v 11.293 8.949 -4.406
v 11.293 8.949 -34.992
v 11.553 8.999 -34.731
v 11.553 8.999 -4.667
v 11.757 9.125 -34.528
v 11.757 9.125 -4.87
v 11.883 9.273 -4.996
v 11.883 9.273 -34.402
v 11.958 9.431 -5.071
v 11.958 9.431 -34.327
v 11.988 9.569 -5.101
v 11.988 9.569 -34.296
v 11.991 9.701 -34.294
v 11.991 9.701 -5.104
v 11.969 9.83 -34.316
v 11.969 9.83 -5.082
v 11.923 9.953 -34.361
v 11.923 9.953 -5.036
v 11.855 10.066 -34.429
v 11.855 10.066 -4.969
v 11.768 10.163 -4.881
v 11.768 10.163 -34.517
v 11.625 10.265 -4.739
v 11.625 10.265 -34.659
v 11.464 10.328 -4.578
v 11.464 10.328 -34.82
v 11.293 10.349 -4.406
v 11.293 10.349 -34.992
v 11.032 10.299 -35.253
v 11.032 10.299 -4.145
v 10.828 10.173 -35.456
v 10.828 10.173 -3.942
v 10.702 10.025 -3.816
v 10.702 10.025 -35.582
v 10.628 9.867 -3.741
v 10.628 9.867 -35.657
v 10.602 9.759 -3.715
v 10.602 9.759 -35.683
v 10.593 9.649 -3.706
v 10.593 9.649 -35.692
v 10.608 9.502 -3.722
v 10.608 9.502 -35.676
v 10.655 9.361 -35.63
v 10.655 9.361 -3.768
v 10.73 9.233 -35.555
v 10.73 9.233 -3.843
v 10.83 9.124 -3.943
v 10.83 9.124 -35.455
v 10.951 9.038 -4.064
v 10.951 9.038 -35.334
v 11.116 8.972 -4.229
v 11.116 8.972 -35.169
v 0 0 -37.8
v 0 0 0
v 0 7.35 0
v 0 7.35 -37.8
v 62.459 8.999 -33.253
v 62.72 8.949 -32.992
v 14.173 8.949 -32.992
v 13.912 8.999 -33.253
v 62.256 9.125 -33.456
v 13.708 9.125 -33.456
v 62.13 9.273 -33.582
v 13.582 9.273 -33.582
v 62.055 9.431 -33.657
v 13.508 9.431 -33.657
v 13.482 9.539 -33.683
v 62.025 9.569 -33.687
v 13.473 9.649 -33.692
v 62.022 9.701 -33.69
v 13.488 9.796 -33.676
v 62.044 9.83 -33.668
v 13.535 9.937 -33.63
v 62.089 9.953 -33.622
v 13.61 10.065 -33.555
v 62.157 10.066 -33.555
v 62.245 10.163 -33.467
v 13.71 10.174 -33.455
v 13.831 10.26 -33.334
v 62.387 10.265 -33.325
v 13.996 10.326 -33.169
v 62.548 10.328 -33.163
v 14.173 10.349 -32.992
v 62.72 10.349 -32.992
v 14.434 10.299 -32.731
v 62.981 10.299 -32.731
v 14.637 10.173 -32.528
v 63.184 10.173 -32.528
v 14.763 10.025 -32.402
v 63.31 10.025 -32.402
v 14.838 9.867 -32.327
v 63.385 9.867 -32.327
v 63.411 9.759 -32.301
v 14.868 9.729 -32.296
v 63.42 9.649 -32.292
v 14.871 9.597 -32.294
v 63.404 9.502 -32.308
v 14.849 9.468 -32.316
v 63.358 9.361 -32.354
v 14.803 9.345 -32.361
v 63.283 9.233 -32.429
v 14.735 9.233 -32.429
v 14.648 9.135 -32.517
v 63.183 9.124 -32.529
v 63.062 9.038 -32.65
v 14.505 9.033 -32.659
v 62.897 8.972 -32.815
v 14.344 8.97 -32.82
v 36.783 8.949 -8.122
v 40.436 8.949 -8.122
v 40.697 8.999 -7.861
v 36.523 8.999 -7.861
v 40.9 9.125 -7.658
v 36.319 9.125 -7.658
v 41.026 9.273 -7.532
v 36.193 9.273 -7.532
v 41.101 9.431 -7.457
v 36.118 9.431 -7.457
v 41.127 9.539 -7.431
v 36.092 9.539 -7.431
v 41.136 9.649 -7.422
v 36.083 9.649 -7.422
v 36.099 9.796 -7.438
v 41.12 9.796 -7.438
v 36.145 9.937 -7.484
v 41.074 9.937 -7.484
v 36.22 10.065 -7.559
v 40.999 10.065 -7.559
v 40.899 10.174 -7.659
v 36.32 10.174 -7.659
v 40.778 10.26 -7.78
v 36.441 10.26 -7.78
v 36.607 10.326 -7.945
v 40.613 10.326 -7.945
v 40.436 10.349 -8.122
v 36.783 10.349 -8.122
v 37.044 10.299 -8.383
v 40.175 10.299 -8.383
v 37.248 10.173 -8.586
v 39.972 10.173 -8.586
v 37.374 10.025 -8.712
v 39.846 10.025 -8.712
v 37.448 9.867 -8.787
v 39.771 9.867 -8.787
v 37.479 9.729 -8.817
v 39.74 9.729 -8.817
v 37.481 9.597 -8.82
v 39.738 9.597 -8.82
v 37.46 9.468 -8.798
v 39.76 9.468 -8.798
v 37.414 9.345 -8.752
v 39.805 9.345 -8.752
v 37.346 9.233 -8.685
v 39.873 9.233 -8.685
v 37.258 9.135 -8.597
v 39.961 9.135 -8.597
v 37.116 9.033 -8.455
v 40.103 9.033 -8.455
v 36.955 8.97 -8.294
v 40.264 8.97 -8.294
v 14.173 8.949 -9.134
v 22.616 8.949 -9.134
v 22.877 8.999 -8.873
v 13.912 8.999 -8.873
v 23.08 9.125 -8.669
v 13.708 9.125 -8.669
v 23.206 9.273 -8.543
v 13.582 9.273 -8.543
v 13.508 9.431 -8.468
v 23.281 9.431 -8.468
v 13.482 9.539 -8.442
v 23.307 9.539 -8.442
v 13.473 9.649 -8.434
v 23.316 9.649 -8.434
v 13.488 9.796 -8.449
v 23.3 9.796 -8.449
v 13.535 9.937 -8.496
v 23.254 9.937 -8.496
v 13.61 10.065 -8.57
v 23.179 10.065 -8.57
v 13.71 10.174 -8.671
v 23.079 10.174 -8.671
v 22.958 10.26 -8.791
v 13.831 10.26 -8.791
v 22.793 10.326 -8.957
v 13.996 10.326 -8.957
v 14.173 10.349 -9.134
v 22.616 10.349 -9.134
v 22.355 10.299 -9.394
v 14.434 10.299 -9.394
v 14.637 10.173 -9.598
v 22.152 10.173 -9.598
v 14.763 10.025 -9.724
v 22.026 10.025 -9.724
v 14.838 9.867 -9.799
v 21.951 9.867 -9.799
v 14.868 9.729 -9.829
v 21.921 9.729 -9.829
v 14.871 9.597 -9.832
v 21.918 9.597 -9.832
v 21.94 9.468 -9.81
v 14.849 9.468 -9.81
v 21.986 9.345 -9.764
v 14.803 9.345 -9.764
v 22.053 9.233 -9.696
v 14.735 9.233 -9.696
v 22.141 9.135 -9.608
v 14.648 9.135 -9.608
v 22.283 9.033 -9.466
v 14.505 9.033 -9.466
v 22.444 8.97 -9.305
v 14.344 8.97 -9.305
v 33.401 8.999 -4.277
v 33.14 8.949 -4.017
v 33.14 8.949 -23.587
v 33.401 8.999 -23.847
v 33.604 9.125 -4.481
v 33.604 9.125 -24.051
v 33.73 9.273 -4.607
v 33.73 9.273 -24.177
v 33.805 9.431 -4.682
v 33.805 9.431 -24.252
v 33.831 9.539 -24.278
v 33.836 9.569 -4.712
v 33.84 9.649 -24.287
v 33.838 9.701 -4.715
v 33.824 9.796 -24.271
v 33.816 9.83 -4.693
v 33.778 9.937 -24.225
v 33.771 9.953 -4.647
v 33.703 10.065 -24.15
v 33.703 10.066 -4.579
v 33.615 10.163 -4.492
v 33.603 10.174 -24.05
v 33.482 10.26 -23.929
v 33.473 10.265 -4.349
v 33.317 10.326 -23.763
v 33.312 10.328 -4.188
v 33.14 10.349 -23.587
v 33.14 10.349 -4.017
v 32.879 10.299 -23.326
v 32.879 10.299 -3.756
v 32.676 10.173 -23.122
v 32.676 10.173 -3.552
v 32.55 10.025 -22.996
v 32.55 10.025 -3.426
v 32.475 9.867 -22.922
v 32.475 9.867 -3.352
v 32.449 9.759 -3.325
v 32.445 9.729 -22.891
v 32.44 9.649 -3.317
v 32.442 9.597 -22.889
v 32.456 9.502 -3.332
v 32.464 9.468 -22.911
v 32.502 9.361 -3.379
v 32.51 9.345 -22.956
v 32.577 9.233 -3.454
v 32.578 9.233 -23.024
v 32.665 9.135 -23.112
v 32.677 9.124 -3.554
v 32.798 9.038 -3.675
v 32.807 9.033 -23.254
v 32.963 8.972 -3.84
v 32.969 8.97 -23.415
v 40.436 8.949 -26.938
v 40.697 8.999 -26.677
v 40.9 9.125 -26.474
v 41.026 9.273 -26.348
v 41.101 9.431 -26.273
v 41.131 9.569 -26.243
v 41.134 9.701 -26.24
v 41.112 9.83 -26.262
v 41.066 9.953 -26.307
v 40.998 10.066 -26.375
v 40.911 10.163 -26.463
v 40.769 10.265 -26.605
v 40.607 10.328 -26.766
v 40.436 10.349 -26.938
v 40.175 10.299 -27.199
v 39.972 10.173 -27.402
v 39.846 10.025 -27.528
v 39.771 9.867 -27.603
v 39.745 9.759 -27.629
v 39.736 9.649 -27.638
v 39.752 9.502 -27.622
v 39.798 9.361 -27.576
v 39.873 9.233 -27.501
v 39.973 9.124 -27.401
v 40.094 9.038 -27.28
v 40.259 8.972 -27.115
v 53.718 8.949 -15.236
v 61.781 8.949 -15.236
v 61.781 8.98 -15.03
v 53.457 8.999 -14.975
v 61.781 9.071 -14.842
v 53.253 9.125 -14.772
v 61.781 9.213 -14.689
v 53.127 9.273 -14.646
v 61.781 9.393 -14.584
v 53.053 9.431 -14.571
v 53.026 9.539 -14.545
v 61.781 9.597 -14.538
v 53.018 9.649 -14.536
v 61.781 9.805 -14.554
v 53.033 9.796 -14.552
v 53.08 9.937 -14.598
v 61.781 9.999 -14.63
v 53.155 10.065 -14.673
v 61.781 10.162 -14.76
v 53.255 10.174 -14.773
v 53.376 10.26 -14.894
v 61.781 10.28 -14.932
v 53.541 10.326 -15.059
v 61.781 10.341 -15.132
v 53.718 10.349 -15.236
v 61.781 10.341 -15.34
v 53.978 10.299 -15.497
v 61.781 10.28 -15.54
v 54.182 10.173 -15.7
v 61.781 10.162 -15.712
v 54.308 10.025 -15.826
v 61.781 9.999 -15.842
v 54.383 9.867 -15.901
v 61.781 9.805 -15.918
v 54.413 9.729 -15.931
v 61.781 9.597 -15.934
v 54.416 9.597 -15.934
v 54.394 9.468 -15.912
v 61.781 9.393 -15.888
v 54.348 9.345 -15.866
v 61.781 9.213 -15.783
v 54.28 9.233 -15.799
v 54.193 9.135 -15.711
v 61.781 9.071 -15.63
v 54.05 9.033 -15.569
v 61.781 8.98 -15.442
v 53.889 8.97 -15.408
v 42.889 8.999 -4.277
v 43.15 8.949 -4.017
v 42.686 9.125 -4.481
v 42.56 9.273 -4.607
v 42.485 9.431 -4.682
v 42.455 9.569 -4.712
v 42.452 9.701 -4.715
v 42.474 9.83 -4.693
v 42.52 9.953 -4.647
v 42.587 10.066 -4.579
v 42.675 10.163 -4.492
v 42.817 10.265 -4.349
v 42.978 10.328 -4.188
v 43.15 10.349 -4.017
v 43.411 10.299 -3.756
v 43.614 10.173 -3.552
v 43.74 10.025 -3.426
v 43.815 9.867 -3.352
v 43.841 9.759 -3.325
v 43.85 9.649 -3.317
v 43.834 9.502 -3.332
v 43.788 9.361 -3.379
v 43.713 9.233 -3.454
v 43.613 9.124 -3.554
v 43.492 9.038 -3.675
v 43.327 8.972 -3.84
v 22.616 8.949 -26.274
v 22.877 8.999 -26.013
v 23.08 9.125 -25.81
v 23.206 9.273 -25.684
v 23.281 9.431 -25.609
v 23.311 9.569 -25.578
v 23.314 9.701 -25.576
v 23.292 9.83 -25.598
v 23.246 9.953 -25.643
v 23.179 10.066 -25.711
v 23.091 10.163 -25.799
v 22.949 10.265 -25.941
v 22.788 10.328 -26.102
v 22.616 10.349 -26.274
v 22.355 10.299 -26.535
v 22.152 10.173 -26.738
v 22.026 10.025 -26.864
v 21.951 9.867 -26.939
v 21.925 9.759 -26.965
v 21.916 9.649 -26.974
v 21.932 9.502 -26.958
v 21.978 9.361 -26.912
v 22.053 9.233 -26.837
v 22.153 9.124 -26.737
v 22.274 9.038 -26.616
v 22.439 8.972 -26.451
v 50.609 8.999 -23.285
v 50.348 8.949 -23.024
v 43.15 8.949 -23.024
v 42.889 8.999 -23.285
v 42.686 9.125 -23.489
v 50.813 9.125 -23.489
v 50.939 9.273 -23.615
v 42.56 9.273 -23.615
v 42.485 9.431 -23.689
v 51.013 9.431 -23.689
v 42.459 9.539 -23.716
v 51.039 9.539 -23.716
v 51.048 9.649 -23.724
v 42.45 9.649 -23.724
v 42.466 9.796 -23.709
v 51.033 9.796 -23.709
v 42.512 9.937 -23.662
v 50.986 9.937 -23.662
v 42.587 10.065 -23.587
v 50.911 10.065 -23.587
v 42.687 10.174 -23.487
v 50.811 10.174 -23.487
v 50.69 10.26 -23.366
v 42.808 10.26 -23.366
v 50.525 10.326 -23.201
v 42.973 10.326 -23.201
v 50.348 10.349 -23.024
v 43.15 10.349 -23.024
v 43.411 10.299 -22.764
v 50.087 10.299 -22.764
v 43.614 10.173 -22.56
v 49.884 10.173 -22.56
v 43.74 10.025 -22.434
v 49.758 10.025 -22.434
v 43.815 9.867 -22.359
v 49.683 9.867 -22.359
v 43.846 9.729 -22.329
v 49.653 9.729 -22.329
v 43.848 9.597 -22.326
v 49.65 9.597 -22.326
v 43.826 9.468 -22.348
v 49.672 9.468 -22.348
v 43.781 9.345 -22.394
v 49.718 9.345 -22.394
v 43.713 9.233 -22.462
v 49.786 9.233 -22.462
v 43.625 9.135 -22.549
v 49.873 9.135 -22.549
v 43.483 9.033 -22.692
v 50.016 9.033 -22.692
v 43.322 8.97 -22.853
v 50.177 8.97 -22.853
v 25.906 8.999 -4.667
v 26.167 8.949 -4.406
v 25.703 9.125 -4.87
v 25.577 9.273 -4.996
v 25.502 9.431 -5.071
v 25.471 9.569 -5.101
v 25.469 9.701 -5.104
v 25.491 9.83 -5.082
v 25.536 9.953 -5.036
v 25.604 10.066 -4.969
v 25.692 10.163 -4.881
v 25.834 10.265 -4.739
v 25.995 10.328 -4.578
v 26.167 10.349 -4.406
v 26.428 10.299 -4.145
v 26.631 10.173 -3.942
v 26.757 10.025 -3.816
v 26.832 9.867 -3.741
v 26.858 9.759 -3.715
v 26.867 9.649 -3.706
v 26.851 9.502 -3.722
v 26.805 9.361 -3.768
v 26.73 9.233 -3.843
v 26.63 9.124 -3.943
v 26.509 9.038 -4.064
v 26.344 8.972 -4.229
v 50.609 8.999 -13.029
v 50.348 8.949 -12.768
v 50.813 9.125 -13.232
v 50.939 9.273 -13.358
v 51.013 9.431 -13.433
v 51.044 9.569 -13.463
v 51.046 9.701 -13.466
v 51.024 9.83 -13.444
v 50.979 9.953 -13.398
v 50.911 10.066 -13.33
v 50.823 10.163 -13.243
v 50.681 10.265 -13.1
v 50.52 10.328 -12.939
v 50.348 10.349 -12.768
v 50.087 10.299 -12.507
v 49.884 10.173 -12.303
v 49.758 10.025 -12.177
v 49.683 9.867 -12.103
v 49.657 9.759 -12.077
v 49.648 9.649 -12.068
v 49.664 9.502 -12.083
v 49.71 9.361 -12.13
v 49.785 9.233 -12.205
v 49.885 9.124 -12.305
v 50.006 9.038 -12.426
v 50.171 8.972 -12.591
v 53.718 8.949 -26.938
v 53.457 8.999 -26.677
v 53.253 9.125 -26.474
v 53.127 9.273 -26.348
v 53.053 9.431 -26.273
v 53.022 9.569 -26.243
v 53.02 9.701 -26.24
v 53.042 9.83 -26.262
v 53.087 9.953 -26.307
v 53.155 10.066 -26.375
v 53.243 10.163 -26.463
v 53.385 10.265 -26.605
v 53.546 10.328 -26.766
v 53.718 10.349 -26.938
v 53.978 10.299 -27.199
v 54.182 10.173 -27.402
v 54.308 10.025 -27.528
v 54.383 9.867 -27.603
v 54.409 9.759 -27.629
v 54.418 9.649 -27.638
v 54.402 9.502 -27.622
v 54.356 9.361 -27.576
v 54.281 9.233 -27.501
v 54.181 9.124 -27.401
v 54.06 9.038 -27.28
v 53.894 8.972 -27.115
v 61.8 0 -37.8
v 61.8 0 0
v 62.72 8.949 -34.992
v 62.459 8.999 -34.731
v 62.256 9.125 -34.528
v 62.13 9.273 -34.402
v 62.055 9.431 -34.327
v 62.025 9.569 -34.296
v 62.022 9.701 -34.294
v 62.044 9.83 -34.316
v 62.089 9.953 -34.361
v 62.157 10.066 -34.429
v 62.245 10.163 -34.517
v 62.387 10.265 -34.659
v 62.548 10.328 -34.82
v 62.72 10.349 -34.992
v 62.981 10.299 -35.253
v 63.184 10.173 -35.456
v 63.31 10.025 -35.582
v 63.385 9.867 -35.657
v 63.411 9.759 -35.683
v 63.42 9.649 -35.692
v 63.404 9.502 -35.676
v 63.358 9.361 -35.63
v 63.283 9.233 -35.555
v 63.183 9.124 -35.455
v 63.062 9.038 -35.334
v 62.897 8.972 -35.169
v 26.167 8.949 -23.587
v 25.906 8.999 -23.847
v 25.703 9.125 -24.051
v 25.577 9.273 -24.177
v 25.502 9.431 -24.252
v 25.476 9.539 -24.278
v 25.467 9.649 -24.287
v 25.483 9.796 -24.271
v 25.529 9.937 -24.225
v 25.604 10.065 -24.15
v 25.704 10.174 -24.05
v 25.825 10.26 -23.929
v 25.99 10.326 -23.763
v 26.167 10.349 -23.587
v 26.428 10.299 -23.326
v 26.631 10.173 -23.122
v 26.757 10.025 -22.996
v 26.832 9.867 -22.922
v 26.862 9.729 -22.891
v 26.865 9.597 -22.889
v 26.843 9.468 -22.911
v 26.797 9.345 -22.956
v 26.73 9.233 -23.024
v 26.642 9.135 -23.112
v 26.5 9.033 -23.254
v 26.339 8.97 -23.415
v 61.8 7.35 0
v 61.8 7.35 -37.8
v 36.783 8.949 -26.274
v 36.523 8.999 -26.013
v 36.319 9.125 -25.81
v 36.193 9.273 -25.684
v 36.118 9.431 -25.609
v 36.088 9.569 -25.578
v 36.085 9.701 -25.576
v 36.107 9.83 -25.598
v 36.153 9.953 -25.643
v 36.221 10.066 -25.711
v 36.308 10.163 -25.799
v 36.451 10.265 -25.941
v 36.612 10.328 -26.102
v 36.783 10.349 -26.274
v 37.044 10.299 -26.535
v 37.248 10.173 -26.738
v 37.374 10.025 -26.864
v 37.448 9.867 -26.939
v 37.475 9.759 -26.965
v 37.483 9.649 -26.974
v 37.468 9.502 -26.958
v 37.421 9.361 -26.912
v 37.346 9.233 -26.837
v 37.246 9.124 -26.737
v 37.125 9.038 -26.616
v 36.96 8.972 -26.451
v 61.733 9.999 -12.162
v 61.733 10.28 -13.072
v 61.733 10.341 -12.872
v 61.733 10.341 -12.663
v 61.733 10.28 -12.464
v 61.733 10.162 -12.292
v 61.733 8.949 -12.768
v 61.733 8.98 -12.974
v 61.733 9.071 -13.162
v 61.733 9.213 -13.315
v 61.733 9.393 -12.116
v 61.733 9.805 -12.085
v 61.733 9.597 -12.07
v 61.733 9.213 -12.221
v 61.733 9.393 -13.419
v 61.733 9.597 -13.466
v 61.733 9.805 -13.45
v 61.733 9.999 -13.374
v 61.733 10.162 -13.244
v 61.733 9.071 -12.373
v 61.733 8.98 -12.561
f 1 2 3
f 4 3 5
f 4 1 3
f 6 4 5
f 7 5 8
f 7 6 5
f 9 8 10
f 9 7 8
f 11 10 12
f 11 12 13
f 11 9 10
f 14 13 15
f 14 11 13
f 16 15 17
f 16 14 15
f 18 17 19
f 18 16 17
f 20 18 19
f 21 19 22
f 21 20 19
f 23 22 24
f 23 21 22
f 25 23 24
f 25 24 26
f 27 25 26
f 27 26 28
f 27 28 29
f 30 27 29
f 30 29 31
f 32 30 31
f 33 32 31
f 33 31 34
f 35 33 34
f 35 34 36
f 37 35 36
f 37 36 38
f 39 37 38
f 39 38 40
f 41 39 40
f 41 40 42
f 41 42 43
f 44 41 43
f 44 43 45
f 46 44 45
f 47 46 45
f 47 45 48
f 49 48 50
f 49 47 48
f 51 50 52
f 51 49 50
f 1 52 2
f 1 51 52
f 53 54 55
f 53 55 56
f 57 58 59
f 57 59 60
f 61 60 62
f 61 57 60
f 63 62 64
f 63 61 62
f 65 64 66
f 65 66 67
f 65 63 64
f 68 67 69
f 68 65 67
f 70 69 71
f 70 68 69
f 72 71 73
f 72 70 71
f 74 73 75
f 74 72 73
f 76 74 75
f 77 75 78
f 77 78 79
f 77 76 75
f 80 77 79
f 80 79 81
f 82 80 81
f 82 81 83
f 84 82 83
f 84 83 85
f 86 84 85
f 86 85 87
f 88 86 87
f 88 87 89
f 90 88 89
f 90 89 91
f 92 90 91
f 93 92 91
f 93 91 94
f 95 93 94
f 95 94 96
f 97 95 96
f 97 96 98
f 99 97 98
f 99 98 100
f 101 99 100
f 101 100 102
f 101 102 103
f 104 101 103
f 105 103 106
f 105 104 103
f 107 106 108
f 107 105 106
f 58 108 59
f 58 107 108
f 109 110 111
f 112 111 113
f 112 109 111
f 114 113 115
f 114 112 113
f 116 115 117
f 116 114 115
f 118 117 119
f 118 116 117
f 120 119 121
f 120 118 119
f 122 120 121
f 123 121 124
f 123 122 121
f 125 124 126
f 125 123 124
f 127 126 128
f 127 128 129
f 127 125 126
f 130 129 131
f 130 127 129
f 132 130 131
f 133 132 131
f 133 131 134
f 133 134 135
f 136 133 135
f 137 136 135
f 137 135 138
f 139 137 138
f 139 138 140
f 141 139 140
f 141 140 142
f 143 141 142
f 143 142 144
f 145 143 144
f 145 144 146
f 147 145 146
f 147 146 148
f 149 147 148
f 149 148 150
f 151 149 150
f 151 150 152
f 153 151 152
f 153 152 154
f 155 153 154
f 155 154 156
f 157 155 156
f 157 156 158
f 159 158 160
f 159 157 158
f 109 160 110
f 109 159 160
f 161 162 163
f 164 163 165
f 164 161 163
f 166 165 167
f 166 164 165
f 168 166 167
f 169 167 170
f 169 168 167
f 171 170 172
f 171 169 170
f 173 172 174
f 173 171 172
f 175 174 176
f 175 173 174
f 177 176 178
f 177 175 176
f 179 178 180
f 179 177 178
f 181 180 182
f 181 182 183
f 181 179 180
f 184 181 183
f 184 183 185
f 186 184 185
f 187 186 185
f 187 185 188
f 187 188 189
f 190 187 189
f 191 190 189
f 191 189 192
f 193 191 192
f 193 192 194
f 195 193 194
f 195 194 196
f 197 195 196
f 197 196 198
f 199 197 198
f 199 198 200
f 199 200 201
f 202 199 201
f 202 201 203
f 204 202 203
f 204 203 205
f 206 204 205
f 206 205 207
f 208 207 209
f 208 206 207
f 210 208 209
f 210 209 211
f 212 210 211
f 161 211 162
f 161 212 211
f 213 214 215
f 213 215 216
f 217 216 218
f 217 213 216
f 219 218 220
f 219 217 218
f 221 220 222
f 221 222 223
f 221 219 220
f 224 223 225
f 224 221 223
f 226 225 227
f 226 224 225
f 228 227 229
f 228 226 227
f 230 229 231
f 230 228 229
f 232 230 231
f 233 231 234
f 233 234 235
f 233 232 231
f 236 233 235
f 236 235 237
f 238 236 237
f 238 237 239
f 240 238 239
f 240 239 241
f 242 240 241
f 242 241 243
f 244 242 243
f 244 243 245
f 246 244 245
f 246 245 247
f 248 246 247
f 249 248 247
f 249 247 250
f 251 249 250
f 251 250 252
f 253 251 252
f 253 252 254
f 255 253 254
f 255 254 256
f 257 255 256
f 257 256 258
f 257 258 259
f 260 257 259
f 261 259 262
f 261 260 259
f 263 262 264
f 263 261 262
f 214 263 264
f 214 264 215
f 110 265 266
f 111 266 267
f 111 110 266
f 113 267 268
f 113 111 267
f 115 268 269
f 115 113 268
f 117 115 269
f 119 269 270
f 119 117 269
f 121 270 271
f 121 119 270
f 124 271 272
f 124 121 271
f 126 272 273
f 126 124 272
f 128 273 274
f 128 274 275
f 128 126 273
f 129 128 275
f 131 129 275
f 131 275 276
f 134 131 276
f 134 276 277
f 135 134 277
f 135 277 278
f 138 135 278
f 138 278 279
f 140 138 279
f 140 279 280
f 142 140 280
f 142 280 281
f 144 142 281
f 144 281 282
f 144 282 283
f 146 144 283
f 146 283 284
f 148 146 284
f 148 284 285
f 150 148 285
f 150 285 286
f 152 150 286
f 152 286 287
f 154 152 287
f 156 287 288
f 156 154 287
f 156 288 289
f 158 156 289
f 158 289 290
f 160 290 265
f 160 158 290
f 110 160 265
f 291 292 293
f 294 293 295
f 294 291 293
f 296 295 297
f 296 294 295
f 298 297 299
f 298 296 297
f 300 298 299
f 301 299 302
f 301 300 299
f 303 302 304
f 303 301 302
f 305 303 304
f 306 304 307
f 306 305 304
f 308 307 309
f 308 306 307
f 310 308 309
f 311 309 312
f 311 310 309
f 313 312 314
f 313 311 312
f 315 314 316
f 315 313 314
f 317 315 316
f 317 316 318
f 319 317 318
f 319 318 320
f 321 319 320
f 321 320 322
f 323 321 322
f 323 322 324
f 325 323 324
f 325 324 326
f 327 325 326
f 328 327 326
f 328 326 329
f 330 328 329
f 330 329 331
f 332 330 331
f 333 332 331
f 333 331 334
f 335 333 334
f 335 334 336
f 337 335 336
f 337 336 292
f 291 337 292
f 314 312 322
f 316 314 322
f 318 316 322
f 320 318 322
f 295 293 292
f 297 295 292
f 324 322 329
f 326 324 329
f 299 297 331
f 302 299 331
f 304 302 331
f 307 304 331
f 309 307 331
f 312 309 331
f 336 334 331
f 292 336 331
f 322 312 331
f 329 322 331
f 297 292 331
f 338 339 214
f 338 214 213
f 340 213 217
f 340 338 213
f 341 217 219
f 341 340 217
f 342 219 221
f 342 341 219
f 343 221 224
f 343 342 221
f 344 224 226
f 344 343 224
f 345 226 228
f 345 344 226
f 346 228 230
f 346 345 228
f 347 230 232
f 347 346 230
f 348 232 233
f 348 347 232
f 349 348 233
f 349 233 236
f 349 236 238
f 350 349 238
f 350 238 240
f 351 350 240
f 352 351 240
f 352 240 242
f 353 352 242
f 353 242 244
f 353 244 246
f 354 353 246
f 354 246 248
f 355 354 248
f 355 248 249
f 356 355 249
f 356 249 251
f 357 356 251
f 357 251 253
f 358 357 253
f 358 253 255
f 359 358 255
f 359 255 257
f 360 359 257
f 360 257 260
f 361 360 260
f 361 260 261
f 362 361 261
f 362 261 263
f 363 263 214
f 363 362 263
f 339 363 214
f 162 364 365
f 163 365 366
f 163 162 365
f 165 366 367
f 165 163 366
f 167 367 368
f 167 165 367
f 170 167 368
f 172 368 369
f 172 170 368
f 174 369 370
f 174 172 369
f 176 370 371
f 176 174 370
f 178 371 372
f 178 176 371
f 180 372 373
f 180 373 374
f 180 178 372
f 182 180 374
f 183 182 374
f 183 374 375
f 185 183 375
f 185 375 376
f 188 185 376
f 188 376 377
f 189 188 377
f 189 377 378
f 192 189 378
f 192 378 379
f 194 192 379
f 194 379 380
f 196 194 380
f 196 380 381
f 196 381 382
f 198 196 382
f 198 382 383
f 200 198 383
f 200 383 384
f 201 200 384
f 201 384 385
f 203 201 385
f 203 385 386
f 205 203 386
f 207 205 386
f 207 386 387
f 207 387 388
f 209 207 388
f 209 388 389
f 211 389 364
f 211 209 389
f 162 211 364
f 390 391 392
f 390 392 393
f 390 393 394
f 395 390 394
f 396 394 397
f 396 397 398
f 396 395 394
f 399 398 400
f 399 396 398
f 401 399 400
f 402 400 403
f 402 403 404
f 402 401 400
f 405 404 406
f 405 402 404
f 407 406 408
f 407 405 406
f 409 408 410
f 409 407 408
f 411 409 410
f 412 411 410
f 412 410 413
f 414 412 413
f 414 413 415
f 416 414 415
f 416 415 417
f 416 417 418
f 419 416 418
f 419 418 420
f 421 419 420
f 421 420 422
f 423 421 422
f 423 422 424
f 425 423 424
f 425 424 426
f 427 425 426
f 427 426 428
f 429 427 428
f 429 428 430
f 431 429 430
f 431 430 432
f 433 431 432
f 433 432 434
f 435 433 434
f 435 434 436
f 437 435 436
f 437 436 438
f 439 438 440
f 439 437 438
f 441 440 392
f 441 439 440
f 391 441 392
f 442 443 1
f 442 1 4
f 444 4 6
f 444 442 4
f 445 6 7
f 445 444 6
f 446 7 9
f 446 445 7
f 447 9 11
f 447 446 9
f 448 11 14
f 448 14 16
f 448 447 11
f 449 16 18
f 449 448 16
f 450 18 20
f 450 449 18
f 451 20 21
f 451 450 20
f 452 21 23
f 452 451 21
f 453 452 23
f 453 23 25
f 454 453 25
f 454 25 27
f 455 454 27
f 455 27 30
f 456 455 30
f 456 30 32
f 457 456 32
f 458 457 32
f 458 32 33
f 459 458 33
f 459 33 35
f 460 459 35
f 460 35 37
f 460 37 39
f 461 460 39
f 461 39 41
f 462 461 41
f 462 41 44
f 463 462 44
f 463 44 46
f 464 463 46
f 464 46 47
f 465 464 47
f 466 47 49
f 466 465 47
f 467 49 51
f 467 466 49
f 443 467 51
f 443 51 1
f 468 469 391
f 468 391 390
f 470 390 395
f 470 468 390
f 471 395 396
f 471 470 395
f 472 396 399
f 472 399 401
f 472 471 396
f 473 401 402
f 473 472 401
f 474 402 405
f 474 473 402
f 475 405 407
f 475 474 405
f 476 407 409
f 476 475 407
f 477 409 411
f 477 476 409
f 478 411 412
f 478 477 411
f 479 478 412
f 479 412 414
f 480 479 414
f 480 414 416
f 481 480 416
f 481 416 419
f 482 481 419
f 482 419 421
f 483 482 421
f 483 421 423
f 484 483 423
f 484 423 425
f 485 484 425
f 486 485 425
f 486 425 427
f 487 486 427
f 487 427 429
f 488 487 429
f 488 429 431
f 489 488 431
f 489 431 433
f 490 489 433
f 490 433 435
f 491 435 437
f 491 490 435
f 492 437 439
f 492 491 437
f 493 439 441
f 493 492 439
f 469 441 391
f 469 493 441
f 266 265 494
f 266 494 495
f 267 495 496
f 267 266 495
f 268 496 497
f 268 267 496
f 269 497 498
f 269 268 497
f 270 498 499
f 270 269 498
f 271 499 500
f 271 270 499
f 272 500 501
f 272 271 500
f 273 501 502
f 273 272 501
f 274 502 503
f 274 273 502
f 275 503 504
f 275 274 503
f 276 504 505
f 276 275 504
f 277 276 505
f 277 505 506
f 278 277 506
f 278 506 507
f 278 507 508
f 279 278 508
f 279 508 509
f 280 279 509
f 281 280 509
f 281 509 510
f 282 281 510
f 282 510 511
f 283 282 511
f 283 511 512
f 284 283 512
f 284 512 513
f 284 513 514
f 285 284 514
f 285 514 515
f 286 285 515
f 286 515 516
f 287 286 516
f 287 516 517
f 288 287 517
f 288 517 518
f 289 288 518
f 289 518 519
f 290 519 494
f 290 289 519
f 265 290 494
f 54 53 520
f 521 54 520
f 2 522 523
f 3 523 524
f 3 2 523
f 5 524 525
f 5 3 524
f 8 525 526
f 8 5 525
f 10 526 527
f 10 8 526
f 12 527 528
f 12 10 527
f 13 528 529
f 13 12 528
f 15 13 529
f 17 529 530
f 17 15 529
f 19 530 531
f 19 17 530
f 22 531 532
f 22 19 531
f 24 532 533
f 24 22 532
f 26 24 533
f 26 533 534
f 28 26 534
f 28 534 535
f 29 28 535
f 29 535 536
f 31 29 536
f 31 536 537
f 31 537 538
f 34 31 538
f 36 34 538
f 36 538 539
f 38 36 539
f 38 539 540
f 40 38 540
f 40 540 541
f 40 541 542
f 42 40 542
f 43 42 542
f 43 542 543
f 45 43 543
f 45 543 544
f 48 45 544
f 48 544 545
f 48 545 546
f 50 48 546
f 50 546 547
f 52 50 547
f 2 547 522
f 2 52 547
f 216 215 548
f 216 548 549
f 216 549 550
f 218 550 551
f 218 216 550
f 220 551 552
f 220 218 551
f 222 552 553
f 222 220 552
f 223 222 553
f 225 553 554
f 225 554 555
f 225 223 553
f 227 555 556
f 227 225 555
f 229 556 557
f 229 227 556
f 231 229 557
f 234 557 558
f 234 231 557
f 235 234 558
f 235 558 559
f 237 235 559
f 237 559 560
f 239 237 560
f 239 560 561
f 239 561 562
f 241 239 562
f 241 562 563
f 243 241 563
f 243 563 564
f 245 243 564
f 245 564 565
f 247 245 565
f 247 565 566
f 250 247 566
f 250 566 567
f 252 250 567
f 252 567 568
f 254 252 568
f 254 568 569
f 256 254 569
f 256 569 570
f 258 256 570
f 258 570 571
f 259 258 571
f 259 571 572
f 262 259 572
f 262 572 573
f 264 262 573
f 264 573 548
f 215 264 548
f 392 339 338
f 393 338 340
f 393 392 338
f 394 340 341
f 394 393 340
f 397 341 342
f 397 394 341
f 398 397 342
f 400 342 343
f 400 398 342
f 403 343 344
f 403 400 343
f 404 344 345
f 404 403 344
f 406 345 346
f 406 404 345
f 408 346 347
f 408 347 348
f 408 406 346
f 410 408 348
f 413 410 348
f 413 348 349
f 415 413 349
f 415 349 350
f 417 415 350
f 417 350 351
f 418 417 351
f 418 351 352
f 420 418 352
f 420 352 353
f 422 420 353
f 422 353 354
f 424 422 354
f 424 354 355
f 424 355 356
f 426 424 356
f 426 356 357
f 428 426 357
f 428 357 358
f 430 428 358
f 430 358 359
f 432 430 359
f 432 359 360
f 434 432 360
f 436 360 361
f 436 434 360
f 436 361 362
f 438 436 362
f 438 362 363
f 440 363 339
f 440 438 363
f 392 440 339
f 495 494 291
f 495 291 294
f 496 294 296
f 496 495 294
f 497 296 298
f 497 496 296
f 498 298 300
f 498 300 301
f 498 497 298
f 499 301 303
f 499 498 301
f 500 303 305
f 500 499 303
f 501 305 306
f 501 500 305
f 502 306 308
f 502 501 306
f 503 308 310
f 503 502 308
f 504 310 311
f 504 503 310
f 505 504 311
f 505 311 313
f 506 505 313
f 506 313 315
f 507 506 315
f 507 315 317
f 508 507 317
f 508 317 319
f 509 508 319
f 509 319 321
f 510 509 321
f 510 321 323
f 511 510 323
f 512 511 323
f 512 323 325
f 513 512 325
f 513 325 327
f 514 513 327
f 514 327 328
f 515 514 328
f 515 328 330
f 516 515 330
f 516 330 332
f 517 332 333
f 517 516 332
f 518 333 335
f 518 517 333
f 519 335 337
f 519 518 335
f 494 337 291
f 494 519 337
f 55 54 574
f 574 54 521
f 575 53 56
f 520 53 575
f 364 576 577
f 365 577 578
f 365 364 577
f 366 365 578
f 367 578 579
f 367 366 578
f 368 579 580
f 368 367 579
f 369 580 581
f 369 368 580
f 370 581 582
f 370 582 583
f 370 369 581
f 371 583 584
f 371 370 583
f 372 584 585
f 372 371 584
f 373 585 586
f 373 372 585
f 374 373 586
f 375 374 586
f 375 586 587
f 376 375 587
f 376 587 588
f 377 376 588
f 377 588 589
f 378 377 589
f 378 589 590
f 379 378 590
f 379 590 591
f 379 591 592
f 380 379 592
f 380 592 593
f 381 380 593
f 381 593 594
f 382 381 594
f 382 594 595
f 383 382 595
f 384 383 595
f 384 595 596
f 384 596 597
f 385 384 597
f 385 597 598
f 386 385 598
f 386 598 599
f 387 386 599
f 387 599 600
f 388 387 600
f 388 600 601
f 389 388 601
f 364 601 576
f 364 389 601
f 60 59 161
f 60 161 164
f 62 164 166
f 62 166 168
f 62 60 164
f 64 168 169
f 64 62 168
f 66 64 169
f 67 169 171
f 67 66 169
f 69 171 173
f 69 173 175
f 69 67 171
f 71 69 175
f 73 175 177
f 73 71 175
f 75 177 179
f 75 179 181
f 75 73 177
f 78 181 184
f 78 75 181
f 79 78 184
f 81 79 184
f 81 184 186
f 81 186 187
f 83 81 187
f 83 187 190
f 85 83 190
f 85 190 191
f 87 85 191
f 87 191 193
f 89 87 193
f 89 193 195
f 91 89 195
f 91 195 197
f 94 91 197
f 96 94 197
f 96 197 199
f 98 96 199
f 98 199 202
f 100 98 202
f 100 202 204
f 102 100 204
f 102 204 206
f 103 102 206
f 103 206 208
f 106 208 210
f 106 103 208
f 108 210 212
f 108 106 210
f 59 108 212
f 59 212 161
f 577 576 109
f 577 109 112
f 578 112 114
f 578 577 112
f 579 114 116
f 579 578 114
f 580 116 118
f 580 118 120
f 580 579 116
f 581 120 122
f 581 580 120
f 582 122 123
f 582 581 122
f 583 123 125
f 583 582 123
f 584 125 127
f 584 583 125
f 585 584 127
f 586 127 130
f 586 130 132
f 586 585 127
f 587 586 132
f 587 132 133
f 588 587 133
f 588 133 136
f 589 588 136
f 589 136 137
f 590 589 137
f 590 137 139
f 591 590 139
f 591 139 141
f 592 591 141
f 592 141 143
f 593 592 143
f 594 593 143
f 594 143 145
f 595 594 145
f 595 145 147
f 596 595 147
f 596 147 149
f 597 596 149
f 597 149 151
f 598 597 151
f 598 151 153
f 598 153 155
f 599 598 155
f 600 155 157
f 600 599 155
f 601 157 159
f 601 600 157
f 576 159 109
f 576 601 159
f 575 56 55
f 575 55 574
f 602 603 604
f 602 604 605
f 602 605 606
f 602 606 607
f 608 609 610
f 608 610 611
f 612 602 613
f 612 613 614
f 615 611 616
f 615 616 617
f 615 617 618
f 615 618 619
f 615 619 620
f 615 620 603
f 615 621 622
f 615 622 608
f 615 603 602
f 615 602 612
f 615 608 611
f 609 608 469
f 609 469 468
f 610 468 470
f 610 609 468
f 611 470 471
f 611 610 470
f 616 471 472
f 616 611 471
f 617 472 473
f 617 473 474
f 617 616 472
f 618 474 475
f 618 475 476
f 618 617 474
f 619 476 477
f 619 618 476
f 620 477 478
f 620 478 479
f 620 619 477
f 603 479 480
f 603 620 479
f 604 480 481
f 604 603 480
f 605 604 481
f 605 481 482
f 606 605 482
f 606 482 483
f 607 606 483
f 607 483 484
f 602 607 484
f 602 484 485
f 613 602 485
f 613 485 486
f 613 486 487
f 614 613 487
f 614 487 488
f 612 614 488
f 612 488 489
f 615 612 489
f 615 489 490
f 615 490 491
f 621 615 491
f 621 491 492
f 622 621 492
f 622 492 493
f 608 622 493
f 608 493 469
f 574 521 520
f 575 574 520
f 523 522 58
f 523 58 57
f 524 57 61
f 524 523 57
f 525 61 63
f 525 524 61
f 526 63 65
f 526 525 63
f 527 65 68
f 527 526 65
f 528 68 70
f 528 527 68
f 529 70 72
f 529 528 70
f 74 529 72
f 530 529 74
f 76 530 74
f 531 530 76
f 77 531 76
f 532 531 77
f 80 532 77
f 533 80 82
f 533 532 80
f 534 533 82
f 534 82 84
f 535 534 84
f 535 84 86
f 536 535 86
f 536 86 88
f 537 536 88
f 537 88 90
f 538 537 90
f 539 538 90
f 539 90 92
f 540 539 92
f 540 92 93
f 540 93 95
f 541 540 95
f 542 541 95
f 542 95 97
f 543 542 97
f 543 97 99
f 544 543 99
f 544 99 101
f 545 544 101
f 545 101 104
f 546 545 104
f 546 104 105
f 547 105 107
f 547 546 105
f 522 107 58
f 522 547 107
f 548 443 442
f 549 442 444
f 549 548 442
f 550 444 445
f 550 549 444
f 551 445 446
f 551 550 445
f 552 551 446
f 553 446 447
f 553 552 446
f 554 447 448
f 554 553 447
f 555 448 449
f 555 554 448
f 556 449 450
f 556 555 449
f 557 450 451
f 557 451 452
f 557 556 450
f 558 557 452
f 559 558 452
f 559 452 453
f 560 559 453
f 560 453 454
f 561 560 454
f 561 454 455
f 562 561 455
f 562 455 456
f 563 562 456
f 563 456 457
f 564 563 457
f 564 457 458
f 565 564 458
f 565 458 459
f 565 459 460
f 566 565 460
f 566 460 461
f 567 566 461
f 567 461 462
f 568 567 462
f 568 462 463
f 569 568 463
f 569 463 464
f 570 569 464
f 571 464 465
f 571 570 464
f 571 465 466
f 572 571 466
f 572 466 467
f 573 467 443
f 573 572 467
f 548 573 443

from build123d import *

# Parameters (mm, degrees)
SKETCH1_W           = 61.8
SKETCH1_H           = 37.8
BOSS_EXTRUDE1_DEPTH = 7.35
SWEEP10_PROFILE_R   = 0.7


with BuildPart() as part:
    # Sketch1 → Boss-Extrude1 (new body)
    with BuildSketch(Plane(origin=(0, 0, 0), x_dir=(1, 0, 0), z_dir=(0, 1, 0))):
        with Locations((30.9, 18.9)):
            Rectangle(SKETCH1_W, SKETCH1_H)
    extrude(amount=BOSS_EXTRUDE1_DEPTH)


with BuildPart() as body_2:
    # Sweep10: sweep along a curve in space
    with BuildLine() as sweep10_path:
        Line((50.348210612, 9.649049906, -12.767787099), (61.733496817, 9.649049906, -12.767787099))
        Line((50.348210612, 9.649049906, -23.024330237), (50.348210612, 9.649049906, -12.767787099))
        Line((43.150066459, 9.649049906, -23.024330237), (50.348210612, 9.649049906, -23.024330237))
        Line((43.150066459, 9.649049906, -4.01673083), (43.150066459, 9.649049906, -23.024330237))
        Line((33.140147245, 9.649049906, -4.01673083), (43.150066459, 9.649049906, -4.01673083))
        Line((33.140147245, 9.649049906, -23.586685249), (33.140147245, 9.649049906, -4.01673083))
        Line((26.166945096, 9.649049906, -23.586685249), (33.140147245, 9.649049906, -23.586685249))
        Line((26.166945096, 9.649049906, -4.405947917), (26.166945096, 9.649049906, -23.586685249))
        Line((11.292743837, 9.649049906, -4.405947917), (26.166945096, 9.649049906, -4.405947917))
        Line((11.292743837, 9.649049906, -4.405947917), (11.292743837, 9.649049906, -34.991932611))
        Line((11.292743837, 9.649049906, -34.991932611), (62.71996786, 9.649049906, -34.991932611))
        Line((62.71996786, 9.649049906, -32.991932611), (62.71996786, 9.649049906, -34.991932611))
        Line((14.172794182, 9.649049906, -32.991932611), (62.71996786, 9.649049906, -32.991932611))
        Line((14.172794182, 9.649049906, -32.991932611), (14.172794182, 9.649049906, -9.133529412))
        Line((14.172794182, 9.649049906, -9.133529412), (22.616013628, 9.649049906, -9.133529412))
        Line((22.616013628, 9.649049906, -9.133529412), (22.616013628, 9.649049906, -26.273866291))
        Line((22.616013628, 9.649049906, -26.273866291), (36.783339685, 9.649049906, -26.273866291))
        Line((36.783339685, 9.649049906, -26.273866291), (36.783339685, 9.649049906, -8.121979781))
        Line((36.783339685, 9.649049906, -8.121979781), (40.435853434, 9.649049906, -8.121979781))
        Line((40.435853434, 9.649049906, -8.121979781), (40.435853434, 9.649049906, -26.9379597))
        Line((40.435853434, 9.649049906, -26.9379597), (53.717721612, 9.649049906, -26.9379597))
        Line((53.717721612, 9.649049906, -26.9379597), (53.717721612, 9.649049906, -15.235955734))
        Line((53.717721612, 9.649049906, -15.235955734), (61.781400604, 9.649049906, -15.235955734))
    # Sweep10 profile (on start of the path) → Sweep10 (sweep)
    with BuildSketch(Plane(origin=(61.781400604, 9.649049906, -15.235955734), x_dir=(0, -1, 0), z_dir=(-1, 0, 0))):
        Circle(SWEEP10_PROFILE_R)
    sweep(path=sweep10_path.line, transition=Transition.RIGHT)


solid = Compound([part.part, body_2.part])
